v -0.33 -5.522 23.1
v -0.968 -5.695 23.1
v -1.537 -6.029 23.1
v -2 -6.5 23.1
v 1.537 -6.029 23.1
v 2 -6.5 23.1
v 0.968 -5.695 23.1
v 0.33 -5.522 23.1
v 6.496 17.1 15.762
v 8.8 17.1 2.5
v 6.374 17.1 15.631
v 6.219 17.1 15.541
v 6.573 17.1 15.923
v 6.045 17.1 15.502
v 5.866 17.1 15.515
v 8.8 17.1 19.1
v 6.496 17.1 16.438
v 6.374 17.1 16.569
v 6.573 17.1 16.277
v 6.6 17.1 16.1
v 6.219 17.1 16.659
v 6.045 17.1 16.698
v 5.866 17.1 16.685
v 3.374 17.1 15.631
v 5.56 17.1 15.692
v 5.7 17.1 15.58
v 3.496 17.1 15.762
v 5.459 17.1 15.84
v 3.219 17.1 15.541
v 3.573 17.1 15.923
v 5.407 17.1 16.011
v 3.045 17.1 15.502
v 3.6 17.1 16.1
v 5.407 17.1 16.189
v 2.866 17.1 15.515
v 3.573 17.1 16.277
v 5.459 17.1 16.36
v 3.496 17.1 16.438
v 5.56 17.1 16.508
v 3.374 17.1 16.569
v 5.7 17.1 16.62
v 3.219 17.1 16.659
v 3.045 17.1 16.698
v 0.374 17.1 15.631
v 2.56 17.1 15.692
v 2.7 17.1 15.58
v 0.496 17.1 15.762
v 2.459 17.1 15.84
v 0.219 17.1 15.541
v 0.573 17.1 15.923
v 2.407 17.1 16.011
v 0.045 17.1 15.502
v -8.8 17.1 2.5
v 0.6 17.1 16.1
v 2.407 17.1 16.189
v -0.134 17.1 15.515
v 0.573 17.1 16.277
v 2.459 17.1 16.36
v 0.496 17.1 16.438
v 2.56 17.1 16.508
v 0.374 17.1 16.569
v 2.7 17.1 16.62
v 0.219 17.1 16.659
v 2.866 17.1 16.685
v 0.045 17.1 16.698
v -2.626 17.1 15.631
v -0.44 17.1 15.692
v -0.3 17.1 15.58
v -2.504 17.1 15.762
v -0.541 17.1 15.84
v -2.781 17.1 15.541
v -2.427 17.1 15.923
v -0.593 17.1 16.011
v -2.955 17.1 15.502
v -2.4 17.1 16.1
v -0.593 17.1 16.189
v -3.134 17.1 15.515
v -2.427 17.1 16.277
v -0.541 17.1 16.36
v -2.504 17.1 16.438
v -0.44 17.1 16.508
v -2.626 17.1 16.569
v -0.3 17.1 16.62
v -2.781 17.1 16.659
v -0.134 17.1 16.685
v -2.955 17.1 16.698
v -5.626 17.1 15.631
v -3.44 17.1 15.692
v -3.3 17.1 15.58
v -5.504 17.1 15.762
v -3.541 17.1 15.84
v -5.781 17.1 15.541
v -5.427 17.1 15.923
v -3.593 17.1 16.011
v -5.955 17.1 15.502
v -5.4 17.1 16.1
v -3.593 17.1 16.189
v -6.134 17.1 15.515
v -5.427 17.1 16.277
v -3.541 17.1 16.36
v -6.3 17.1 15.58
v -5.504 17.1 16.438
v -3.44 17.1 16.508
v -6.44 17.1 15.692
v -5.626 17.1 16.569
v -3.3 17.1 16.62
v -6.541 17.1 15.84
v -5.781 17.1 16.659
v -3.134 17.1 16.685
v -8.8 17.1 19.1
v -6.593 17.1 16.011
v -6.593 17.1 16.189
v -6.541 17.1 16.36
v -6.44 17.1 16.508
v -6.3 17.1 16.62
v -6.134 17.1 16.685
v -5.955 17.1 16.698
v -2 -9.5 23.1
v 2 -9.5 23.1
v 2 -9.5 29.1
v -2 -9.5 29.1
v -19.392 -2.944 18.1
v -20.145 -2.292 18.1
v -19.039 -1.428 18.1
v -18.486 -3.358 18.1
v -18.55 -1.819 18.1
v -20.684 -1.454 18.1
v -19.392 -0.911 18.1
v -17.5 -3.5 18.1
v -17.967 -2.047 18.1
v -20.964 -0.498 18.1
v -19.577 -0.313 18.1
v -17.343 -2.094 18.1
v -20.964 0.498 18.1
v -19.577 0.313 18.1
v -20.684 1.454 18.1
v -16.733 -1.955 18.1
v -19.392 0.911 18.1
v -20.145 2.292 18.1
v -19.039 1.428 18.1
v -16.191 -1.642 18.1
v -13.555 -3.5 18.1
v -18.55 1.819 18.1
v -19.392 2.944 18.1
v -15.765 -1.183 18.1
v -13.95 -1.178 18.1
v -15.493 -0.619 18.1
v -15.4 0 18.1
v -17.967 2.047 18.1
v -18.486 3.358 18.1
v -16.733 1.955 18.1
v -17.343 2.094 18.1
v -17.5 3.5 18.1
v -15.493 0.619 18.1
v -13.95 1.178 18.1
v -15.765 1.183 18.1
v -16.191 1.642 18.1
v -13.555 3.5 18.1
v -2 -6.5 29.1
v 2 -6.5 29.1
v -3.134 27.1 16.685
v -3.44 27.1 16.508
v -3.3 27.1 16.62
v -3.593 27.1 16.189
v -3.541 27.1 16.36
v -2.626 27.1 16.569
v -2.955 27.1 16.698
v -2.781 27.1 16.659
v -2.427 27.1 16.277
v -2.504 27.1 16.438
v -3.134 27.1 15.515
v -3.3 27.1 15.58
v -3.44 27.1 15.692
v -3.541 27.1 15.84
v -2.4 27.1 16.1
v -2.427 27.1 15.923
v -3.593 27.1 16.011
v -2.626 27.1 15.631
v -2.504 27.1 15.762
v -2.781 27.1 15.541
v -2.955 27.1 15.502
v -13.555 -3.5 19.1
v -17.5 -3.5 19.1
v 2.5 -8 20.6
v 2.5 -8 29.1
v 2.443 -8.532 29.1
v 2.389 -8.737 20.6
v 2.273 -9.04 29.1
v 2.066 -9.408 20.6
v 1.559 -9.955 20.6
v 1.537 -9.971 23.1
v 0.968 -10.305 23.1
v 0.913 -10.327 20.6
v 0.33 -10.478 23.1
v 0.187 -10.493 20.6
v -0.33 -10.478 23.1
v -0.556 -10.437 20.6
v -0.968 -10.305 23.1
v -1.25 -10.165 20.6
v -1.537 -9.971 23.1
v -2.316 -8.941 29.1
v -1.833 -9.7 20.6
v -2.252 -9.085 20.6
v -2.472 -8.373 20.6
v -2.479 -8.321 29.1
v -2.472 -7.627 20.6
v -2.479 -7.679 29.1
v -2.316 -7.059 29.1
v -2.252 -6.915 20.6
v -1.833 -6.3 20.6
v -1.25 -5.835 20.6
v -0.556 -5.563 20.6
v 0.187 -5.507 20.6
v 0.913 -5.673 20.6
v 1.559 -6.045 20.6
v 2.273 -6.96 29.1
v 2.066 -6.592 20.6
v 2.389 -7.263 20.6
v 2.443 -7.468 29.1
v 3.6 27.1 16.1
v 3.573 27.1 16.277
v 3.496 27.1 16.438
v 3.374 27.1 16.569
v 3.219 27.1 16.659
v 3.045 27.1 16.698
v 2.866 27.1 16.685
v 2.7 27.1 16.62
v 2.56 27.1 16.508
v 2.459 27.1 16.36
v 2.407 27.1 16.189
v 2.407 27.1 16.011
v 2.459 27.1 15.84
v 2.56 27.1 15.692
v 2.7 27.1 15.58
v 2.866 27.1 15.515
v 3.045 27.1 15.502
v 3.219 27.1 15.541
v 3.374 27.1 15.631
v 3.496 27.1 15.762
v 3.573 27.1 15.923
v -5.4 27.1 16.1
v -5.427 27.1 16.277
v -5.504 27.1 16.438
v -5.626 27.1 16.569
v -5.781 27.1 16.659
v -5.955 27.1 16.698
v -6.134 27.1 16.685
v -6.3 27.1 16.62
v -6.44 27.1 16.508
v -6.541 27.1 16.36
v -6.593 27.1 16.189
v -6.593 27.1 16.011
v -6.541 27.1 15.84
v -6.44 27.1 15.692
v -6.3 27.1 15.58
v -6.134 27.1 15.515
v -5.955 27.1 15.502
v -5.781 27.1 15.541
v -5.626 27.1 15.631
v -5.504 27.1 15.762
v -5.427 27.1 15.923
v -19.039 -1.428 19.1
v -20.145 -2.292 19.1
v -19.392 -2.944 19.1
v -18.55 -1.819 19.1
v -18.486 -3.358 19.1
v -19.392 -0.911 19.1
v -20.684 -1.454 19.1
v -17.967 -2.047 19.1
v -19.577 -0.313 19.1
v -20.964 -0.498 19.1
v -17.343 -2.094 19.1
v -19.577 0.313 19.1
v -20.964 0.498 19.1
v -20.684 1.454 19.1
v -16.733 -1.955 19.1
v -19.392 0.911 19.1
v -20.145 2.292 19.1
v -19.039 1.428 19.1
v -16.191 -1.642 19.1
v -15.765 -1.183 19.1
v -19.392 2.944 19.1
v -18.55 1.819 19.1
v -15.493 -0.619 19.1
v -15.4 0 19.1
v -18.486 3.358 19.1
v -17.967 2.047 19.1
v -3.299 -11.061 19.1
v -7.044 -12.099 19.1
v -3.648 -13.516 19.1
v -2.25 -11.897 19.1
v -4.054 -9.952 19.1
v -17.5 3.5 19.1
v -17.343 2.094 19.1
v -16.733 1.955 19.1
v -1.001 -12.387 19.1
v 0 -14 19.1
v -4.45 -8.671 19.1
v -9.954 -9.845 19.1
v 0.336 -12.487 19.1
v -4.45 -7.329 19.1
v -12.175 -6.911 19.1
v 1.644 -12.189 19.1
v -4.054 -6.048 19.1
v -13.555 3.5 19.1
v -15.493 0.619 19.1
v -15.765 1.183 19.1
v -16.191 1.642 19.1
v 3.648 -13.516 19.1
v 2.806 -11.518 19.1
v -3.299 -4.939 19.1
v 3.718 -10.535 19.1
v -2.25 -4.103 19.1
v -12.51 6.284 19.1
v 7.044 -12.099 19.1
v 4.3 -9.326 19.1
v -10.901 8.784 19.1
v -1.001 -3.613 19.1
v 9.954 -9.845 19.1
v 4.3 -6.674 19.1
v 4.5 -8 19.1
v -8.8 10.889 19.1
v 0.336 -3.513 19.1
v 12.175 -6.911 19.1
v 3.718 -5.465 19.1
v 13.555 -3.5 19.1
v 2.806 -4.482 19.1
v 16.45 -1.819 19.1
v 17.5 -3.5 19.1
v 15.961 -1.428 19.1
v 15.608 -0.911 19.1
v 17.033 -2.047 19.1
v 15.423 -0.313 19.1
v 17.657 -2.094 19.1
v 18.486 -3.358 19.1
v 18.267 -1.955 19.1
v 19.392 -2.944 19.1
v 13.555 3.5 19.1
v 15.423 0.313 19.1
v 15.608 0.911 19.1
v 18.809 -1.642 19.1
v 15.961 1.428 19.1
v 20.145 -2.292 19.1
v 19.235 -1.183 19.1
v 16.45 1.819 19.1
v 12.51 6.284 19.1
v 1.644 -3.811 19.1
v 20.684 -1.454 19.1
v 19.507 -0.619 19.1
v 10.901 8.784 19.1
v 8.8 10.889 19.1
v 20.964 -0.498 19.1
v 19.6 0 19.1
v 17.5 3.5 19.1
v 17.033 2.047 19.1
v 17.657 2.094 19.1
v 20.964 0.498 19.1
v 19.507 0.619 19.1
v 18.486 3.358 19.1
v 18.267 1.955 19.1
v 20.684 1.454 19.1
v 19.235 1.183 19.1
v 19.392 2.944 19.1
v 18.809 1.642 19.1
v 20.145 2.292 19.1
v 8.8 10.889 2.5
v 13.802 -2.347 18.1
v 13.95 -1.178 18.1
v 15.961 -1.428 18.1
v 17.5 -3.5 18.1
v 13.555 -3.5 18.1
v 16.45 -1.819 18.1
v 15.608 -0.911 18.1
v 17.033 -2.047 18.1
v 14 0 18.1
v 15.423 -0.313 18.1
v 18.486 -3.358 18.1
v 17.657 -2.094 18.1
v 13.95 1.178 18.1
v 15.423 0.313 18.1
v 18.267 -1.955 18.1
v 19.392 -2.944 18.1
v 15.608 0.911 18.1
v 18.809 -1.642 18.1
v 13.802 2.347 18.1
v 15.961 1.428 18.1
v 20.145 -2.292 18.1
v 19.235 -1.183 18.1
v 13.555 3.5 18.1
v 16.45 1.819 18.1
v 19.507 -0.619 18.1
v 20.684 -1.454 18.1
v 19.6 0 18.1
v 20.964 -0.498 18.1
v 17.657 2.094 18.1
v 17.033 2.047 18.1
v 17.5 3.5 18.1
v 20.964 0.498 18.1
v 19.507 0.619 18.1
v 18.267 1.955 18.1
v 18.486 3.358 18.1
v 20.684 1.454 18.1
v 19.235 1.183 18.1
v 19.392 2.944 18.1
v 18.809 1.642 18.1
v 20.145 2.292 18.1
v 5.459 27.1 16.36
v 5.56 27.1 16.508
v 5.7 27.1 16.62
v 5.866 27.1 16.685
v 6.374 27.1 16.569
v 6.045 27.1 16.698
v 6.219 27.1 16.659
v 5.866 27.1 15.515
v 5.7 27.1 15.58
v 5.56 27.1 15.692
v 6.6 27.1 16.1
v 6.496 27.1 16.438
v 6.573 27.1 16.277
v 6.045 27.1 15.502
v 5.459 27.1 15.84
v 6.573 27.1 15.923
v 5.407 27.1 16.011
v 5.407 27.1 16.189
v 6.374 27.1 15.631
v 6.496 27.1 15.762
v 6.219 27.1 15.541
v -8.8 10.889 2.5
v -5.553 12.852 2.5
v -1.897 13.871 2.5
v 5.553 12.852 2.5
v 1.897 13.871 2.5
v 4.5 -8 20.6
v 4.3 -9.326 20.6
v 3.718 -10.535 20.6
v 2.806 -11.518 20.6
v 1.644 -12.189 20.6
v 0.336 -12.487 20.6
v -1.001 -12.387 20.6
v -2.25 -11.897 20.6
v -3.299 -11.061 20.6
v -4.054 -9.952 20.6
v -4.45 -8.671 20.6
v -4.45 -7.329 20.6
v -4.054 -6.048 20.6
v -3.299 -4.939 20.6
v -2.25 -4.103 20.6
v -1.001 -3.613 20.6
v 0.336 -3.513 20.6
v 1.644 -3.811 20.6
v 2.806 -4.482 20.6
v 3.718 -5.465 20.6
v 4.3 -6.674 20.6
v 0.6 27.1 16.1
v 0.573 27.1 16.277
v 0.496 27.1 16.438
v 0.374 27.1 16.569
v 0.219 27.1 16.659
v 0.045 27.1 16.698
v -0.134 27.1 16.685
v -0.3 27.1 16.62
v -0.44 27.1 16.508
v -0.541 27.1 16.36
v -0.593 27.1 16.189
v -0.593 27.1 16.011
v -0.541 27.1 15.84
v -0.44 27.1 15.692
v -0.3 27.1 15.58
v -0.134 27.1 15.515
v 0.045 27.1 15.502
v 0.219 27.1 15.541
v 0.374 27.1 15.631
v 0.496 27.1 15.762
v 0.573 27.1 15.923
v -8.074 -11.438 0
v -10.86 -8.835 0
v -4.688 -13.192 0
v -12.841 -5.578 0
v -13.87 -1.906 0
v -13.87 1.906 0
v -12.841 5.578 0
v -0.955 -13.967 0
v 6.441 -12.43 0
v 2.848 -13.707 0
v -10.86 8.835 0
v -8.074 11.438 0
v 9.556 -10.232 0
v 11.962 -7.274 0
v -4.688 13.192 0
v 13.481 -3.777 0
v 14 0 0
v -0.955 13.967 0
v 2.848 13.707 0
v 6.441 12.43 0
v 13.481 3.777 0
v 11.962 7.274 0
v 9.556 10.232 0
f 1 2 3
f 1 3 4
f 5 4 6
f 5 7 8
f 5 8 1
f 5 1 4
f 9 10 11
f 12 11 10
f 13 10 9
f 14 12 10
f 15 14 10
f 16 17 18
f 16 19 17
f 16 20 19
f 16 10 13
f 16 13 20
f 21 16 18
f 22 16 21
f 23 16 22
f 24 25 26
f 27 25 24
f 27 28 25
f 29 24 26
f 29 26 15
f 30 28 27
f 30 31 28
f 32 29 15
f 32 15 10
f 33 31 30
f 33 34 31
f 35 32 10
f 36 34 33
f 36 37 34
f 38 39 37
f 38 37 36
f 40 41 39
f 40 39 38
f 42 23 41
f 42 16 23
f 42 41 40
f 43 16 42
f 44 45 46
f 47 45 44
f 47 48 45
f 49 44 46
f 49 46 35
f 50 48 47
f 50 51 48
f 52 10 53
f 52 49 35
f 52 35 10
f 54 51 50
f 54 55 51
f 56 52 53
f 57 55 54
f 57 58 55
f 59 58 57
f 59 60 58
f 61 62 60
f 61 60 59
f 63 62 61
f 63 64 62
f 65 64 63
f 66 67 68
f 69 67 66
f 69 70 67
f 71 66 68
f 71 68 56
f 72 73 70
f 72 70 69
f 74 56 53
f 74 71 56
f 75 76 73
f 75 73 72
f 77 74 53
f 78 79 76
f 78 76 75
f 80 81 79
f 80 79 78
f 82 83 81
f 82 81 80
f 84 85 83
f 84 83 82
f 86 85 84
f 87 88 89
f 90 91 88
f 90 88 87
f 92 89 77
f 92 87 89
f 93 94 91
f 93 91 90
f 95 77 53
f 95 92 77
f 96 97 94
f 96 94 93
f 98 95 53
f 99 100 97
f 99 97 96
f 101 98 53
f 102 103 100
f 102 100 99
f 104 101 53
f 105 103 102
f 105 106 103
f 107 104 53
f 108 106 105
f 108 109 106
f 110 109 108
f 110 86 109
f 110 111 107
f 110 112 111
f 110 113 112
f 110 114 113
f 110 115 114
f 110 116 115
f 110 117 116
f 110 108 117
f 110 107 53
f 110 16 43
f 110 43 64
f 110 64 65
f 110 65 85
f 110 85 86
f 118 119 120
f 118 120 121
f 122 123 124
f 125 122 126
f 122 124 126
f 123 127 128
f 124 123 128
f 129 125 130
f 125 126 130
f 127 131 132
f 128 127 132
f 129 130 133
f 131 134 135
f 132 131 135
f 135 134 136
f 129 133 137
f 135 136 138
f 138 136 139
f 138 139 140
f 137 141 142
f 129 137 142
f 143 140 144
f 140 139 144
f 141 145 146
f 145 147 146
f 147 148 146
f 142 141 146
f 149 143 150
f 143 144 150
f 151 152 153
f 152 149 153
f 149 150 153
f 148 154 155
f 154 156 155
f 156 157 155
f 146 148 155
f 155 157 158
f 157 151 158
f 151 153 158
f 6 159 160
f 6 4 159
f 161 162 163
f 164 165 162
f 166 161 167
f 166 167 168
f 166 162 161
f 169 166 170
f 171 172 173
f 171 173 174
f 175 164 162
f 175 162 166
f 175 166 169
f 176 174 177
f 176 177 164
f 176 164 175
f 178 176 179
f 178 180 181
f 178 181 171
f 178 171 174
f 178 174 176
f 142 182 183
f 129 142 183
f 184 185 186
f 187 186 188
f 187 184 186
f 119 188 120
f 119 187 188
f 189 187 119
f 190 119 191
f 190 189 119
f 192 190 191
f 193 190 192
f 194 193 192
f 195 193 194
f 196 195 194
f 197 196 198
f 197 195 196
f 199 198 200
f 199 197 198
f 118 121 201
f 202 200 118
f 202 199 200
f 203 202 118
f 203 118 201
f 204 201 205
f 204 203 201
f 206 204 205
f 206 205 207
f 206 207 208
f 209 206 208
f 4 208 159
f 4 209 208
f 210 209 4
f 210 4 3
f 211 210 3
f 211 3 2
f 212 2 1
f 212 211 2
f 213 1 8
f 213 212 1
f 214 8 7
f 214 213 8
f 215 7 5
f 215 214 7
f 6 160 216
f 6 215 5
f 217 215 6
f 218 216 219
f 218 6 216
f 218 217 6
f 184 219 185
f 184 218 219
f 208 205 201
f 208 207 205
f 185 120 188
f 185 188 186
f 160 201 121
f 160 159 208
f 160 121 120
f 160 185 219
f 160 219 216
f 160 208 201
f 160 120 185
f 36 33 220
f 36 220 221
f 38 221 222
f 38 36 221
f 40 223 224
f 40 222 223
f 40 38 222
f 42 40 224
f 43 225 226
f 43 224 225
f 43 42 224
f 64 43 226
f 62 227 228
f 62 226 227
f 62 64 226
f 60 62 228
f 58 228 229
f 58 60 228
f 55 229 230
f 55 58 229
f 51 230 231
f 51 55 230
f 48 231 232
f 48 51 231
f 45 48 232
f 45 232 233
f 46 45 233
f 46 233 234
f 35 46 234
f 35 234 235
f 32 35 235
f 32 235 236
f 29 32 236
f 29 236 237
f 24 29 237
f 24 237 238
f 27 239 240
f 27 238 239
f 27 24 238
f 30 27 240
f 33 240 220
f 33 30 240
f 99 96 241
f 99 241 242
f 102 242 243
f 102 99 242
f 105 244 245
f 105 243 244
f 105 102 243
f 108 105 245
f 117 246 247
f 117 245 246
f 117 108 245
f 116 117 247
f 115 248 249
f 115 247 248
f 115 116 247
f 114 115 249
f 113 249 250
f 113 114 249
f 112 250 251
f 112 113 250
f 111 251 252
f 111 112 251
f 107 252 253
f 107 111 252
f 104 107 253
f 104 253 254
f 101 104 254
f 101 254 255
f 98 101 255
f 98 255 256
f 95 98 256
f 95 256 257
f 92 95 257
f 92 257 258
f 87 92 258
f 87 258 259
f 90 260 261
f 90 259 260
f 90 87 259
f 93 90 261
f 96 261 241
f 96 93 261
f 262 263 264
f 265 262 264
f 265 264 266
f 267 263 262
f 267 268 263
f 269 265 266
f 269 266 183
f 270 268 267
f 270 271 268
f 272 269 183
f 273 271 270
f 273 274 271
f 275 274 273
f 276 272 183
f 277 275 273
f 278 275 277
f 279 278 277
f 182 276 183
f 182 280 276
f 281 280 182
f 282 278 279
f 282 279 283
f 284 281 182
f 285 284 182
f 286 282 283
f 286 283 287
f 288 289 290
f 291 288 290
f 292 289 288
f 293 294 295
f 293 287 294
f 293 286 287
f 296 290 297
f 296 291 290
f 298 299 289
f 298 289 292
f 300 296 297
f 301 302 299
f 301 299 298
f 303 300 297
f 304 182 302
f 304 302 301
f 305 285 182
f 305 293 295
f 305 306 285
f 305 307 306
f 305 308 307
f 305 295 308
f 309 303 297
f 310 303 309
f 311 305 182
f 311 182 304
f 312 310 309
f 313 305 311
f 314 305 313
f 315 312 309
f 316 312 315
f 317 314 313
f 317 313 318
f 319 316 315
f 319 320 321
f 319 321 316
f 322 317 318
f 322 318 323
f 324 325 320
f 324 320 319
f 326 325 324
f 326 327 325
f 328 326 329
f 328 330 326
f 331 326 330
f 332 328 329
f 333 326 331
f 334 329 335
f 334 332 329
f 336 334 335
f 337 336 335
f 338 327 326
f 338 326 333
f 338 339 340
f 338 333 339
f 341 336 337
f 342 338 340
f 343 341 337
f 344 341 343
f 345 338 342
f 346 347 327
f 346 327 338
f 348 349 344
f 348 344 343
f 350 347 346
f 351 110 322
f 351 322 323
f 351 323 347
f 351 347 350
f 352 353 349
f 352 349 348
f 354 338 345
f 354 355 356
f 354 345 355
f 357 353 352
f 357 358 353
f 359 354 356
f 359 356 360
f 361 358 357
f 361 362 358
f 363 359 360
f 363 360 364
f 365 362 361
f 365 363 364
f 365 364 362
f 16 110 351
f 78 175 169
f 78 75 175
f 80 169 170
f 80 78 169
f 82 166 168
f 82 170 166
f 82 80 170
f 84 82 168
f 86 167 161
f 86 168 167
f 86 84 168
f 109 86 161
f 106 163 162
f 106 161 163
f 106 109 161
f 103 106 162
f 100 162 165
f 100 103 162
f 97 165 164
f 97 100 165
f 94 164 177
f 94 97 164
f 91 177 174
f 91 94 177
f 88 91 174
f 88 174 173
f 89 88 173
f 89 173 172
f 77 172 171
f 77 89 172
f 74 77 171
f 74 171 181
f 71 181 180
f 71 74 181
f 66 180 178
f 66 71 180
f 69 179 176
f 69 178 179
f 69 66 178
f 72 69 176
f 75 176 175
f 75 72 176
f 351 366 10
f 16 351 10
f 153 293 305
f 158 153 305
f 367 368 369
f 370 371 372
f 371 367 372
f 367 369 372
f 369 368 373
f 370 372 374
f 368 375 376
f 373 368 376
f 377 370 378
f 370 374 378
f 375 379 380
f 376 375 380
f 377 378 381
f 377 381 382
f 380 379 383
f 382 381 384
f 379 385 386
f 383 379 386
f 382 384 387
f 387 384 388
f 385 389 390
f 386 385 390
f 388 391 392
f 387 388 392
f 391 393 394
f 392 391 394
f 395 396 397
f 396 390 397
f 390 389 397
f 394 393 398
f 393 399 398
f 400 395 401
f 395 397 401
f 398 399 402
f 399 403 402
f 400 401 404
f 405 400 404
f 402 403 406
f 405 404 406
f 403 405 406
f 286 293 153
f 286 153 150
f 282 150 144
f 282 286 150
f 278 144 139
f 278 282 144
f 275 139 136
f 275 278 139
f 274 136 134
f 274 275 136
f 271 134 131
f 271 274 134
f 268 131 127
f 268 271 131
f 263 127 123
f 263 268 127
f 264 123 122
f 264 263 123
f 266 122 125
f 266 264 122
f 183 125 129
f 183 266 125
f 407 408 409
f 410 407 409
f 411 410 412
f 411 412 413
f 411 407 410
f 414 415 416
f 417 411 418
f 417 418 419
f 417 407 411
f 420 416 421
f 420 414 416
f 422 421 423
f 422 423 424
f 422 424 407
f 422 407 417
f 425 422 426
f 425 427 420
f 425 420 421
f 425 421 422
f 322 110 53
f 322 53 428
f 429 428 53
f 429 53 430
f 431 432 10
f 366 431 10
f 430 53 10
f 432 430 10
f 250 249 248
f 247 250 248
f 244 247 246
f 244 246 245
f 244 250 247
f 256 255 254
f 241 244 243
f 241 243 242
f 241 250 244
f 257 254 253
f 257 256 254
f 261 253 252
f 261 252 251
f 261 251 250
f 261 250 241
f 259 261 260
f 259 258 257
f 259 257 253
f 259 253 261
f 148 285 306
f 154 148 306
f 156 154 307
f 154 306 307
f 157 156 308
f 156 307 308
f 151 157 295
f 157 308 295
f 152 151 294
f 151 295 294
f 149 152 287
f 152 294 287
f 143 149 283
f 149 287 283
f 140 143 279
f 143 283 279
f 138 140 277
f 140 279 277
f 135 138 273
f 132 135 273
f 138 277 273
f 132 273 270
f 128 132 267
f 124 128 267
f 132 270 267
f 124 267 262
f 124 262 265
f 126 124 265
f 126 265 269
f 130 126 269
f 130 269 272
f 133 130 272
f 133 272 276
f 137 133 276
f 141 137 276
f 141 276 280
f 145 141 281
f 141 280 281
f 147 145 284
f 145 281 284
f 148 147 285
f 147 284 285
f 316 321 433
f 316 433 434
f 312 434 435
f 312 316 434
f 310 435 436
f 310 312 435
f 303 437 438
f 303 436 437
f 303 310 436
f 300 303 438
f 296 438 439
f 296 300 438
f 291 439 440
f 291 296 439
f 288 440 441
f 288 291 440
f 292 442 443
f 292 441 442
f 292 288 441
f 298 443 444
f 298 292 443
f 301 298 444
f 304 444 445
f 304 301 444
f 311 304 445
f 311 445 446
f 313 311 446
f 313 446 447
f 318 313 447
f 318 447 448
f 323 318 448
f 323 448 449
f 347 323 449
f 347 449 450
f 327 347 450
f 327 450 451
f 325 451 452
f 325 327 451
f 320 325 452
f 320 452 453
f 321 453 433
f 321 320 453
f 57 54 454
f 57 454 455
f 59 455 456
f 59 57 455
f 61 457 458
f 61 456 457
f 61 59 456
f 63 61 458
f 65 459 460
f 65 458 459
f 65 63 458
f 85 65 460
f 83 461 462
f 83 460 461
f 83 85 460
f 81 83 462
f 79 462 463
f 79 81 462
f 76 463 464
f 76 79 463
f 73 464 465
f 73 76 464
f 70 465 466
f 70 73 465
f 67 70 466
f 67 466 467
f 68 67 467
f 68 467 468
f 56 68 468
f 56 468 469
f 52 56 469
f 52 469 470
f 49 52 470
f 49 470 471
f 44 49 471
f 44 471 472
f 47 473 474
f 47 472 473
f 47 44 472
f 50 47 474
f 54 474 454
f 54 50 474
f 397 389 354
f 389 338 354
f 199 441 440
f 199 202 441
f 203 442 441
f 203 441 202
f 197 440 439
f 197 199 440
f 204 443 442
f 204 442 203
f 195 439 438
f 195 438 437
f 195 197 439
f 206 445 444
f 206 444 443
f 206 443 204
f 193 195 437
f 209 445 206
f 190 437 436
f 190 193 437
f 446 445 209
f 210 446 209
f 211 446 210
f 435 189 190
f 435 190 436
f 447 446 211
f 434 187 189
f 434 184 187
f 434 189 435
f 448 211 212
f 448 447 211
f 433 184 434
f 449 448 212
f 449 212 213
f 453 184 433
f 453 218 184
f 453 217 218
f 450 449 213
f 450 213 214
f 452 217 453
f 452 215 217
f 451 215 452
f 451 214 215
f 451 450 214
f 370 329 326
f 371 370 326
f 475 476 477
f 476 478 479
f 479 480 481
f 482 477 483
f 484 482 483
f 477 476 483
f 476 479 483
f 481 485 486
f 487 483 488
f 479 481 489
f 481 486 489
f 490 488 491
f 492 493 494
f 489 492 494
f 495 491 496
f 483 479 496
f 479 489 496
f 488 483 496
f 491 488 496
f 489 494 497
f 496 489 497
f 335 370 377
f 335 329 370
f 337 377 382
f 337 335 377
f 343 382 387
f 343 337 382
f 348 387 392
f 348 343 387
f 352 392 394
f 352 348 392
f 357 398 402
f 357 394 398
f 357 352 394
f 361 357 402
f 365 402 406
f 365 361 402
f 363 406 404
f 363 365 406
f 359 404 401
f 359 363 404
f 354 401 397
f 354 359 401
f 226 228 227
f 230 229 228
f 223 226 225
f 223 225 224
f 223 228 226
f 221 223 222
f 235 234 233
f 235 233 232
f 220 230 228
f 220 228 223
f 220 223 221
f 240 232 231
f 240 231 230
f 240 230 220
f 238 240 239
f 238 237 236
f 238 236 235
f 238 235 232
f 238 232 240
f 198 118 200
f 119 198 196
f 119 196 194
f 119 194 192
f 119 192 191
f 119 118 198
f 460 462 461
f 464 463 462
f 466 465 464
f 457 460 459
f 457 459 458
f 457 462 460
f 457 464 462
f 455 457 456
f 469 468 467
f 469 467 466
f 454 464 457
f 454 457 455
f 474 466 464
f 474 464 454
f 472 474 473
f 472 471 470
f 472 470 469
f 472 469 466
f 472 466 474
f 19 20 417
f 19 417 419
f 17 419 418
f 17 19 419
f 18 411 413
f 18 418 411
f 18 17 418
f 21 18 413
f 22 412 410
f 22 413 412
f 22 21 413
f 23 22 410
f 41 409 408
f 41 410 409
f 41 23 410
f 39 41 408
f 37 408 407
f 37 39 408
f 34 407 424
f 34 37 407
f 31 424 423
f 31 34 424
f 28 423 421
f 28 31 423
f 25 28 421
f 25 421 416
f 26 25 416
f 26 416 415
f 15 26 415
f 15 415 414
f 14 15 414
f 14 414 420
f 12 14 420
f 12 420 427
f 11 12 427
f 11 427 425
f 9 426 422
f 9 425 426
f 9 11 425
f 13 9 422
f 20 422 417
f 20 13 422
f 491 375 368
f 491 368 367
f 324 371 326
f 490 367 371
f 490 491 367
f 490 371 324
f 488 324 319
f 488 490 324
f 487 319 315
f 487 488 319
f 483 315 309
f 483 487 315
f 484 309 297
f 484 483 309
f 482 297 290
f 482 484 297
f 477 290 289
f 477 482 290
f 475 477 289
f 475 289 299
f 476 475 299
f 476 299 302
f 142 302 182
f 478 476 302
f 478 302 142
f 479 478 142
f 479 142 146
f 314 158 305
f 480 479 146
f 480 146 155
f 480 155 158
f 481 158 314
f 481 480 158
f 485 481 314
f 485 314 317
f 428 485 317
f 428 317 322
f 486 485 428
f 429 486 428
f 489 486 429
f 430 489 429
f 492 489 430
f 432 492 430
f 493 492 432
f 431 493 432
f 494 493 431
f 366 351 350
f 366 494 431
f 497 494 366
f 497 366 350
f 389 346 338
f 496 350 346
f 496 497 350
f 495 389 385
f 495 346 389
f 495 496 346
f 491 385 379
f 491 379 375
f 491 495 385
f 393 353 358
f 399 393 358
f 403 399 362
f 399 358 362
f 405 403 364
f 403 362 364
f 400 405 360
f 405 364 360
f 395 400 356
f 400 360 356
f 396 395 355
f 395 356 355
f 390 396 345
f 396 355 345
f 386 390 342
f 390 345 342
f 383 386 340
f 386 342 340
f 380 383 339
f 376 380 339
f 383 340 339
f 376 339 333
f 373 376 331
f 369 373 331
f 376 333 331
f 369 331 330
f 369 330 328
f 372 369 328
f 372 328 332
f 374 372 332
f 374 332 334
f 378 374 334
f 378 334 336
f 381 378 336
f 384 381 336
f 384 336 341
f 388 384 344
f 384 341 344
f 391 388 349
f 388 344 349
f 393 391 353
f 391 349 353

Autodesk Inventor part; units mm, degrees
ref_plane "YZ Plane" through (0, 0, 0) normal (1, 0, 0) x (0, 1, 0)
ref_plane "XZ Plane" through (0, 0, 0) normal (0, 1, 0) x (-1, 0, 0)
ref_plane "XY Plane" through (0, 0, 0) normal (0, 0, 1) x (1, 0, 0)
sketch "スケッチ2" plane through (0, 0, 0) normal (0, 0, 1) x (1, 0, 0)
  circle A0 centre (0, 0) radius 14
  dimension "d0" = 28
extrude "本体" add sketch "スケッチ2" along normal blind 19.1
sketch "スケッチ3" plane through (0, 0, 19.1) normal (0, 0, 1) x (1, 0, 0)
  line L0 (0, 16.0197) -> (0, -16.0197) construction
  line L1 (-23.6697, 0) -> (23.6697, 0) construction
  circle A0 centre (-17.5, 0) radius 2.1
  circle A1 centre (17.5, 0) radius 2.1
  circle A2 centre (-17.5, 0) radius 3.5
  circle A3 centre (17.5, 0) radius 3.5
  line L2 (-17.5, 3.5) -> (17.5, 3.5)
  line L3 (17.5, -3.5) -> (-17.5, -3.5)
  point P0 (0, 0)
  point P1 (0, 0)
  dimension "d3" = 4.2
  dimension "d4" = 35
  dimension "d5" = 7
extrude "タブ" add sketch "スケッチ3" against normal blind 1
sketch "スケッチ4" plane through (0, 0, 19.1) normal (0, 0, 1) x (1, 0, 0)
  circle A0 centre (0, -8) radius 4.5
  point P0 (0, 0)
  dimension "d8" = 9
  dimension "d9" = 8
extrude "押し出し3" add sketch "スケッチ4" along normal blind 1.5
sketch "スケッチ5" plane through (0, -8, 20.6) normal (0, 0, 1) x (1, 0, 0)
  circle A0 centre (0, 0) radius 2.5
  circle A1 centre (0, 0) radius 4.5 projected
  point P0 (0, 8)
  dimension "d12" = 5
extrude "押し出し4" add sketch "スケッチ5" along normal blind 2.5 contours A0
sketch "スケッチ6" plane through (0, -8, 23.1) normal (0, 0, 1) x (1, 0, 0)
  circle A0 centre (0, 0) radius 2.5
  circle A1 centre (0, 0) radius 2.5 projected
  line L0 (-2.5, 1.5) -> (2.5, 1.5)
  line L1 (2.5, 1.5) -> (2.5, -1.5)
  line L2 (2.5, -1.5) -> (-2.5, -1.5)
  line L3 (-2.5, -1.5) -> (-2.5, 1.5)
  point P0 (0, 8)
  point P1 (2.5, 0)
  point P2 (0, 1.5)
  point P3 (-2, -1.5)
  point P4 (2, -1.5)
  point P5 (2, 1.5)
  point P6 (-2, 1.5)
  dimension "d15" = 3
extrude "押し出し5" add sketch "スケッチ6" along normal blind 6 contours A0 L2 L0
sketch "スケッチ7" plane through (0, 0, 19.1) normal (0, 0, 1) x (1, 0, 0)
  line L0 (-8.8, 0) -> (8.8, 0)
  line L1 (8.8, 0) -> (8.8, 17.1)
  line L2 (8.8, 17.1) -> (-8.8, 17.1)
  line L3 (-8.8, 17.1) -> (-8.8, 0)
  point P0 (0, 0)
  point P1 (0, 0)
  dimension "d18" = 17.6
  dimension "d19" = 17.1
extrude "押し出し6" add sketch "スケッチ7" against normal blind 16.6
sketch "スケッチ8" plane through (-8.8, 17.1, 19.1) normal (0, 1, 0) x (1, 0, 0)
  circle A0 centre (8.8, 3) radius 0.6
  line L0 (17.6, 0) -> (0, 0) projected
  point P0 (8.8, 19.1)
  dimension "d22" = 1.2
  dimension "d23" = 3
extrude "押し出し7" add sketch "スケッチ8" along normal blind 10
pattern_linear "矩形状パターン1" count 5 spacing 3 along (-1, 0, 0) of "押し出し7" first direction both ways yes
properties part number "28BYJ-48"
